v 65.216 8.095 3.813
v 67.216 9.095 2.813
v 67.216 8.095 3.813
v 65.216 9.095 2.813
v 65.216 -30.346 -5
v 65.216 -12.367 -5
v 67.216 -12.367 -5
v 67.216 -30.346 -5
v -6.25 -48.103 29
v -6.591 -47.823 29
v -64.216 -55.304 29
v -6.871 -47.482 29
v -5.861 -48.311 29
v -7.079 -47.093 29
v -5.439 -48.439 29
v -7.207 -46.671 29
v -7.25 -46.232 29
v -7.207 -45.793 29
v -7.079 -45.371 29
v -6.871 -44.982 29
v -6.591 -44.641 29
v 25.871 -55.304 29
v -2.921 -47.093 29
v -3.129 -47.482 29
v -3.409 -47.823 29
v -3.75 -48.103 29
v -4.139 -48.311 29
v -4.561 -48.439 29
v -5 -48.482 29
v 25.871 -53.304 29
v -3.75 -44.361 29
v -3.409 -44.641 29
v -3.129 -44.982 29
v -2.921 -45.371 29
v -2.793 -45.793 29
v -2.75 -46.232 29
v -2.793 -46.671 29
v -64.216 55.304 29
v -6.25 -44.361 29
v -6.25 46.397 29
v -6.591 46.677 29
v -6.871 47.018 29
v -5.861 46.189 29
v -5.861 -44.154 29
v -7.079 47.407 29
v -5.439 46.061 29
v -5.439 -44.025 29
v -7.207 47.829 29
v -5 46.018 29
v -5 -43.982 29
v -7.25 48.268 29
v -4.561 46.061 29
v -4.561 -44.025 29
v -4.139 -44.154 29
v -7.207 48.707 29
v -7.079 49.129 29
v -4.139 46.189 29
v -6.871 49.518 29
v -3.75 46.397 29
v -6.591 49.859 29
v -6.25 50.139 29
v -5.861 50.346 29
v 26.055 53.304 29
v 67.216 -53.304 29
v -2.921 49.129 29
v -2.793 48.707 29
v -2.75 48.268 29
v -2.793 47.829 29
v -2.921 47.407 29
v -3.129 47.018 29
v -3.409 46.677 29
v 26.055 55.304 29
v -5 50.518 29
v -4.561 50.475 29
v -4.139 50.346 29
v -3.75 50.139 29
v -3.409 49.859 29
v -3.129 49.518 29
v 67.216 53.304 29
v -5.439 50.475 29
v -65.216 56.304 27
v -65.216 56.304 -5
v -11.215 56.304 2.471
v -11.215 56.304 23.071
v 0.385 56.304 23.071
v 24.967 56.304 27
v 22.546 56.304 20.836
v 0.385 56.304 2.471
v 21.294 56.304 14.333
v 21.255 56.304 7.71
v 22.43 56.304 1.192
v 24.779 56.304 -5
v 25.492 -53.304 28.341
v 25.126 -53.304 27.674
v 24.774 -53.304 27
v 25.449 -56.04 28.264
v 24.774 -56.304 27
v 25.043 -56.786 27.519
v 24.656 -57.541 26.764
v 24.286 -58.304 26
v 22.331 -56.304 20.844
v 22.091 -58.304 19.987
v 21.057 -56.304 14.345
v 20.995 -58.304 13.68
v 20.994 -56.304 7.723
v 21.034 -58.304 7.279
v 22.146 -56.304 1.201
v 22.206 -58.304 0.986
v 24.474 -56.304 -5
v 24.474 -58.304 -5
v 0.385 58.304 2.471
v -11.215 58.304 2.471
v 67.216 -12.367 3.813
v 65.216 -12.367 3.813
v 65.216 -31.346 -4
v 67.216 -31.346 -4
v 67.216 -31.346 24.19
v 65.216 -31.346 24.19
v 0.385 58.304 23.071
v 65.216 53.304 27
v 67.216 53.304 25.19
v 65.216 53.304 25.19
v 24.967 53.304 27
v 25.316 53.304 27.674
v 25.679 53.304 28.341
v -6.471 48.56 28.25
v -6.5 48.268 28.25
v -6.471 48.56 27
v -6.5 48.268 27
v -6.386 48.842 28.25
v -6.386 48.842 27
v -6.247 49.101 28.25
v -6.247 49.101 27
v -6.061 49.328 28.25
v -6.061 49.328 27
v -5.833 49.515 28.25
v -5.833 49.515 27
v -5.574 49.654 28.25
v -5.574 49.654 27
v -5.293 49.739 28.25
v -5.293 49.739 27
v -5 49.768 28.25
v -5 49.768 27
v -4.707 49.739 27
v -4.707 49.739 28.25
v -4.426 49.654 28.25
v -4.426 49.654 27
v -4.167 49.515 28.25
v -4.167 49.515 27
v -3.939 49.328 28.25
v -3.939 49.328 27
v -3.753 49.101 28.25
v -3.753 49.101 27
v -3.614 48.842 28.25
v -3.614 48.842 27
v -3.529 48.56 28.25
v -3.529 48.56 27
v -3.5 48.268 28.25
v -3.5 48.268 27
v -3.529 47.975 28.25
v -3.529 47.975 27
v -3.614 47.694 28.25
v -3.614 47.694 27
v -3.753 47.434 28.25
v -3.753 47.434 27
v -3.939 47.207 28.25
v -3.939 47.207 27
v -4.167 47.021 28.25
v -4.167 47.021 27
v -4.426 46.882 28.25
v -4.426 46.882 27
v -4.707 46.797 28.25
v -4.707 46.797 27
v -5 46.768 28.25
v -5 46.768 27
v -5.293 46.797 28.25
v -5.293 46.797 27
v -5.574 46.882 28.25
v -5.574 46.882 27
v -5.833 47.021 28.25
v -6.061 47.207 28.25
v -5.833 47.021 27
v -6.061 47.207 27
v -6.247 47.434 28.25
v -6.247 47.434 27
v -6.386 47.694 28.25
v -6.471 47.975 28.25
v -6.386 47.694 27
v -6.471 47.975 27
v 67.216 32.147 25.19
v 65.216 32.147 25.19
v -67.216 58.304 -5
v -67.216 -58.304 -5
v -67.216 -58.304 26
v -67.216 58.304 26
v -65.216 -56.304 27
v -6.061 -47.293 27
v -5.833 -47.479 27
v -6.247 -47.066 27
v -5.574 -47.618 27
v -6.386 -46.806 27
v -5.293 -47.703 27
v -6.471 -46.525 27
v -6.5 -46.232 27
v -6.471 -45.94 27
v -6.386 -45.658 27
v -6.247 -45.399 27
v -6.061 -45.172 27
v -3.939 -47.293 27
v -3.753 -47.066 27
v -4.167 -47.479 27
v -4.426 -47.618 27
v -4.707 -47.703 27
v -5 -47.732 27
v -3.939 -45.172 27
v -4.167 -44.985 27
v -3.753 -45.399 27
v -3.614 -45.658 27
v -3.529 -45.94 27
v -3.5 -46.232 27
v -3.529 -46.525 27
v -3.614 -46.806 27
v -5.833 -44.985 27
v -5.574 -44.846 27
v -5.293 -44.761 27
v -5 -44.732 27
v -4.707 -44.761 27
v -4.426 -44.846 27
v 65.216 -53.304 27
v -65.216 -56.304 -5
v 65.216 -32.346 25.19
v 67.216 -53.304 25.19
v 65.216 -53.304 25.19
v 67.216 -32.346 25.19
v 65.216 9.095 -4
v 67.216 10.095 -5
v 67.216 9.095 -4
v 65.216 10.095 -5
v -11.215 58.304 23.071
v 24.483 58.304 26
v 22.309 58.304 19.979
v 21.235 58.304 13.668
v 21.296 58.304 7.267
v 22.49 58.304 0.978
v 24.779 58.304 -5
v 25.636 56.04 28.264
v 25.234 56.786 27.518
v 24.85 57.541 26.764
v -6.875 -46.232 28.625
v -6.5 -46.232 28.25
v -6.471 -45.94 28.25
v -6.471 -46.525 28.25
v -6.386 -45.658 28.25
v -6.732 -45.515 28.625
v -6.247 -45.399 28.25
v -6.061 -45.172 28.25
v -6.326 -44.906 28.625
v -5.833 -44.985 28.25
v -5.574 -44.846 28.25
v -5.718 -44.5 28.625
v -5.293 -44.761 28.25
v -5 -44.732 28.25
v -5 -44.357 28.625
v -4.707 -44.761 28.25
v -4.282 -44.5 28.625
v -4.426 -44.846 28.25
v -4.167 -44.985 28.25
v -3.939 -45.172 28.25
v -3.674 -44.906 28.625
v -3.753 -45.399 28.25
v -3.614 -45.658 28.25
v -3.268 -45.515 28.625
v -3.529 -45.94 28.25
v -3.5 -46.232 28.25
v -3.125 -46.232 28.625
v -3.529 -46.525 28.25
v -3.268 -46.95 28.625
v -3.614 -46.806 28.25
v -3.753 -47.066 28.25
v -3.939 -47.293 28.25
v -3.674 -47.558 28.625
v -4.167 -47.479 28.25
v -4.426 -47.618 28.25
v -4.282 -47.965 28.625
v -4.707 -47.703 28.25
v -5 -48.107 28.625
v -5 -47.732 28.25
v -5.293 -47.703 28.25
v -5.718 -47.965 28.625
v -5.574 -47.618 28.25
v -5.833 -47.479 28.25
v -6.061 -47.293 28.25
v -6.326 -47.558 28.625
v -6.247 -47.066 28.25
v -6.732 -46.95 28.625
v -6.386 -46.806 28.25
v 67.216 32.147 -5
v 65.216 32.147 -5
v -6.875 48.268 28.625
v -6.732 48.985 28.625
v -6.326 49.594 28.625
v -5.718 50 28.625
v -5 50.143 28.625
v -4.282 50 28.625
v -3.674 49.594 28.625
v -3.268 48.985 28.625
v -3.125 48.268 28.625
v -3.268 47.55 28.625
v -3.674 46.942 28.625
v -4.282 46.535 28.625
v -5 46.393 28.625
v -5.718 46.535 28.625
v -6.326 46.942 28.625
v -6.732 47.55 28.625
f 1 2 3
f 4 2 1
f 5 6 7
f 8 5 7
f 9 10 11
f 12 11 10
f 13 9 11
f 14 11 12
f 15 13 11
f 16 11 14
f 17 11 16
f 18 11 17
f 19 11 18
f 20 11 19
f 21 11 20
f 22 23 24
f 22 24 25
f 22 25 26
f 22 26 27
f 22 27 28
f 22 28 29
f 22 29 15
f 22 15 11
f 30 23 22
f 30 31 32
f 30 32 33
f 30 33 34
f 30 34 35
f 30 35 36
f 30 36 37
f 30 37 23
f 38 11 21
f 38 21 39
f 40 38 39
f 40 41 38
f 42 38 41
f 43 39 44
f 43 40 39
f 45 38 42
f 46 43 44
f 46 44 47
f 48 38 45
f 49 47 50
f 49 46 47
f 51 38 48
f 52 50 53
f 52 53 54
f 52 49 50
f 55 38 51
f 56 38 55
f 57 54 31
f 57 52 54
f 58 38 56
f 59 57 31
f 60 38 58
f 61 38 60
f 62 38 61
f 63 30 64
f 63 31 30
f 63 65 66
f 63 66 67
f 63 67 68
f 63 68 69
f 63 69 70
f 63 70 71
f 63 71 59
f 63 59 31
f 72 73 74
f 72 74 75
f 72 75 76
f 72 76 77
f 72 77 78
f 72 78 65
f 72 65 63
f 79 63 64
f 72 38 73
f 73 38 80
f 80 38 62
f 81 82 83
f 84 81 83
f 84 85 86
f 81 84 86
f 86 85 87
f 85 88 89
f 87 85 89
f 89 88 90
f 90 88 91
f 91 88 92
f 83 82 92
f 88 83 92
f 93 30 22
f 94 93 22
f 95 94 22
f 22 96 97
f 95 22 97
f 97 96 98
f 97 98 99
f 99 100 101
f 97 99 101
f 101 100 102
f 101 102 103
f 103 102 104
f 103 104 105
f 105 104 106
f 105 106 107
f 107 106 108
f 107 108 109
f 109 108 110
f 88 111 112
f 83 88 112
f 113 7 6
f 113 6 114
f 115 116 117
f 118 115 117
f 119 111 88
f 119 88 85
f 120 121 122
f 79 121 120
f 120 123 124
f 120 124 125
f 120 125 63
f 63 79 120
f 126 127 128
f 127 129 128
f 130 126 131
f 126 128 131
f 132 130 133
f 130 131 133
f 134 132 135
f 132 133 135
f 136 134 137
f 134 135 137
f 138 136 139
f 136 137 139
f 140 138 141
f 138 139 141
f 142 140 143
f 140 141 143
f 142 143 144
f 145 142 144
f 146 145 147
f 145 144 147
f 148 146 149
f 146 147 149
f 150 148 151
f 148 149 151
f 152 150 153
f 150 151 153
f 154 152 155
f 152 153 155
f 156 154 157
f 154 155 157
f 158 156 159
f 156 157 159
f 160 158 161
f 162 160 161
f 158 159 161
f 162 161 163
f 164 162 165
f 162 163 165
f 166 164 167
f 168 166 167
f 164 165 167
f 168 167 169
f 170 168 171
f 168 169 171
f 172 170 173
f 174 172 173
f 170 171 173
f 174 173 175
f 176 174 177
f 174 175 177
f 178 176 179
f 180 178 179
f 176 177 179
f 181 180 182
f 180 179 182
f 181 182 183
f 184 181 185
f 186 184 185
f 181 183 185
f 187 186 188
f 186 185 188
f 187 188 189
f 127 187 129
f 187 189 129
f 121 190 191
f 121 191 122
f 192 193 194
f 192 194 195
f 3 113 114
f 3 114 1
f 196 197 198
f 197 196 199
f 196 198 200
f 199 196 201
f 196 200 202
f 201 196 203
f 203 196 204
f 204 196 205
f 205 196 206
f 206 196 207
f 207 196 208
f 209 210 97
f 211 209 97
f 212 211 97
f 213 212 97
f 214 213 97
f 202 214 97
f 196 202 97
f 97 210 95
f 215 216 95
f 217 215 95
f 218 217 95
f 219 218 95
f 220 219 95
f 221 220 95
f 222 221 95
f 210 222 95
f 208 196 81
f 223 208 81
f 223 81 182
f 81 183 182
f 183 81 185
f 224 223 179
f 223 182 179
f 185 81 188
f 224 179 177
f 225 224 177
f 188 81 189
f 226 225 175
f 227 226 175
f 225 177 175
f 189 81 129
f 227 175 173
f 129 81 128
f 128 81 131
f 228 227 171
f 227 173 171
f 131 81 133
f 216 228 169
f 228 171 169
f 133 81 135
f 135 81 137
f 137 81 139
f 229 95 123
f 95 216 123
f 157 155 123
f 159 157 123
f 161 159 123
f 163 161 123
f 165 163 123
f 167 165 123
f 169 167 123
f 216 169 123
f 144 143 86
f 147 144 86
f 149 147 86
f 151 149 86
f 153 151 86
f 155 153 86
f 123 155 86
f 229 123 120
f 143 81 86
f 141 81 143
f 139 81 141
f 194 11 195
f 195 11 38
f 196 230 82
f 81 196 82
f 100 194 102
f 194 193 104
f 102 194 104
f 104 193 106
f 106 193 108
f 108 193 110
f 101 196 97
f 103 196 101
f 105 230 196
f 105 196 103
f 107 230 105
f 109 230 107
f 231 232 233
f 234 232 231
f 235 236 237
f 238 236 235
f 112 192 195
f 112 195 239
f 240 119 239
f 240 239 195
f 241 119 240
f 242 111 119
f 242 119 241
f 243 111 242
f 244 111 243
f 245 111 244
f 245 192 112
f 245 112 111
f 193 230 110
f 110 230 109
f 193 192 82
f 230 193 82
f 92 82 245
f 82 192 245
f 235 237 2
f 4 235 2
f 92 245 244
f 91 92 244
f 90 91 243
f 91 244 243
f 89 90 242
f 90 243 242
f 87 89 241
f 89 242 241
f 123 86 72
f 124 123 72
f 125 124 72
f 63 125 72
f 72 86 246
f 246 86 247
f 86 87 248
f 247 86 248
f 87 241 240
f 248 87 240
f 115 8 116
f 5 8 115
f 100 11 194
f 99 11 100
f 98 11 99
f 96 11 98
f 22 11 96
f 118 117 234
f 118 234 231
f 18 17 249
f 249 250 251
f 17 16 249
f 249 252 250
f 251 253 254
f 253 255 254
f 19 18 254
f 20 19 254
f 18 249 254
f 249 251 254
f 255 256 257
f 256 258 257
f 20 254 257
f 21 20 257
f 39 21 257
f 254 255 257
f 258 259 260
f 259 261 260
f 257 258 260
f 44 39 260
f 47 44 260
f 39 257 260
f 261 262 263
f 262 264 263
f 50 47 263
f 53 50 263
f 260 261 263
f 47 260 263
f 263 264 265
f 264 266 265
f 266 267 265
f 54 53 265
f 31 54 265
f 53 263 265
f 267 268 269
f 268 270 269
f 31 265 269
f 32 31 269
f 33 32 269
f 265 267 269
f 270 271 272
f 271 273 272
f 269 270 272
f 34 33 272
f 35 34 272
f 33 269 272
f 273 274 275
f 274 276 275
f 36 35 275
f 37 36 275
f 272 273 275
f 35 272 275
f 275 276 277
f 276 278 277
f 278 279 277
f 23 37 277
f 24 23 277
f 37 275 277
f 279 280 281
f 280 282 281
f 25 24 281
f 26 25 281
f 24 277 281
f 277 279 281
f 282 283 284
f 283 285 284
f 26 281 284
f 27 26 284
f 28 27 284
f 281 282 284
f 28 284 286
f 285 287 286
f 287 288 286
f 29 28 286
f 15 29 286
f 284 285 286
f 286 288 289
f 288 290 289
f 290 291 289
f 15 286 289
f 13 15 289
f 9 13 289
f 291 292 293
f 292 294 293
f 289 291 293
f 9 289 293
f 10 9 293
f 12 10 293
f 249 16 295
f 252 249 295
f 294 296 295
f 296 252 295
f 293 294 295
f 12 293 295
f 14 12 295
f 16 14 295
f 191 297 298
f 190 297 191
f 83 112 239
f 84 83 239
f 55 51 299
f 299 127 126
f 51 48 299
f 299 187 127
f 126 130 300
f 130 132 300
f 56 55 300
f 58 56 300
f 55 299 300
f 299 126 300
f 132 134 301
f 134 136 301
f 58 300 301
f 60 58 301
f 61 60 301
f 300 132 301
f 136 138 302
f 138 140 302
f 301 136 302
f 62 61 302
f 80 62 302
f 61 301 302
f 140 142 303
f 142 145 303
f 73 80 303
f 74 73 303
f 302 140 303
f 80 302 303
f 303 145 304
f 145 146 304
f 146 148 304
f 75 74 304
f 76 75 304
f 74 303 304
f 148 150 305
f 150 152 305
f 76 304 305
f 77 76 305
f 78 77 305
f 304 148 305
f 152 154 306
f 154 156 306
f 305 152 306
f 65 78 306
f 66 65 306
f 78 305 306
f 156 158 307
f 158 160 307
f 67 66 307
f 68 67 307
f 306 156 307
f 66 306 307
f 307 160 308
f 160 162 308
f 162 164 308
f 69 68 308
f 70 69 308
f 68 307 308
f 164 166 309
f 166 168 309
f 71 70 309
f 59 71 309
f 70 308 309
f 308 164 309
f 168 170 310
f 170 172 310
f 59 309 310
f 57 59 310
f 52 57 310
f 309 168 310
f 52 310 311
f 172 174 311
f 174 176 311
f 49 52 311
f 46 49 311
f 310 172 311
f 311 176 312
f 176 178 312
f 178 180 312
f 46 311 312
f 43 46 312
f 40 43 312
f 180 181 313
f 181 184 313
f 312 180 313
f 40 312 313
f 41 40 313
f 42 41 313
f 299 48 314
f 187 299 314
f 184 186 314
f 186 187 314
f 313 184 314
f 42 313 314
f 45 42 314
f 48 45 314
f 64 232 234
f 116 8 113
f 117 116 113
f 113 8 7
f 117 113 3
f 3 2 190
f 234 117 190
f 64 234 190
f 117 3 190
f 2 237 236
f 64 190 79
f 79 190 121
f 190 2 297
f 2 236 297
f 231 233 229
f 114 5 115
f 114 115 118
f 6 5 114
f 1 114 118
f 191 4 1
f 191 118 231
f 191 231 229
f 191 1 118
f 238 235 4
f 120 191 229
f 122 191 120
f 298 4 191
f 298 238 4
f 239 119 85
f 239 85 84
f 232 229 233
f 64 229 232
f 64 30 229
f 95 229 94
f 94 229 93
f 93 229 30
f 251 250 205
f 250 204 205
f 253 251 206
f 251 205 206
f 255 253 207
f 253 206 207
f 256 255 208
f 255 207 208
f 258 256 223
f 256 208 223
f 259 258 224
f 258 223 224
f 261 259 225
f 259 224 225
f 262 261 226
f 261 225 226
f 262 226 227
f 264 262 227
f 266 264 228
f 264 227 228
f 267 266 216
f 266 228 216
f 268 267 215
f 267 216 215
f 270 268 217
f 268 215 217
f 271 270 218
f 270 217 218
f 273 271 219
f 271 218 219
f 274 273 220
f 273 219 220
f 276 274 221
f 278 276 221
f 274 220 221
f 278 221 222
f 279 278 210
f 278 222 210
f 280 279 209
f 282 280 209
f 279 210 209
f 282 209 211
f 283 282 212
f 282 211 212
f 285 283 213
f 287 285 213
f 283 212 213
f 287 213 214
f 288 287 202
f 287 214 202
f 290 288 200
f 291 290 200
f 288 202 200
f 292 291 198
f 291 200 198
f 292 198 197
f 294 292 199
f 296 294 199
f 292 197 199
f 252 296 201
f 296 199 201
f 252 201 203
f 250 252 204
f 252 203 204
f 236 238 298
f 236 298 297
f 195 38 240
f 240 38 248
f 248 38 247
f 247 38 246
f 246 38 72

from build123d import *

# Parameters (mm, degrees)
SKETCH008_W      = 134.431716
SKETCH008_H      = 116.608648
PAD008_DEPTH     = 34
THICKNESS_T      = -2
HOLE_D           = 3
HOLE_DEPTH       = 25
HOLE_CSINK_D     = 4.5
HOLE_CSINK_ANGLE = 90
HOLE_TIPS_R      = 1.5
SKETCH011_W      = 22.22
SKETCH011_H      = 30.19
SKETCH011_W_2    = 21.462421
SKETCH011_H_2    = 8.812902
POCKET_DEPTH     = 5
SKETCH012_R      = 36
POCKET001_DEPTH  = 5
SKETCH013_R      = 36
POCKET002_DEPTH  = 5
CHAMFER_SIZE     = 3
SKETCH015_W      = 11.6
SKETCH015_H      = 20.6
POCKET003_DEPTH  = 5
CHAMFER001_SIZE  = 1


with BuildPart() as part:
    # Sketch008 → Pad008 (new body)
    with BuildSketch(Plane.XY):
        Rectangle(SKETCH008_W, SKETCH008_H)
    extrude(amount=PAD008_DEPTH)

    # Thickness
    thickness_openings = [part.faces().sort_by_distance(p)[0] for p in [
        (0, 0, 0),
    ]]
    offset(amount=THICKNESS_T, openings=thickness_openings)

    # Hole
    with Locations(Plane.XY.offset(34)):
        with Locations((-5, 48.267742), (-5, -46.232258)):
            CounterSinkHole(HOLE_D / 2, HOLE_CSINK_D / 2, depth=HOLE_DEPTH, counter_sink_angle=HOLE_CSINK_ANGLE)

    # Hole tips → Hole tip 1 section 0
    with BuildSketch(Plane.XY.offset(9), mode=Mode.PRIVATE) as hole_tip_1_s0:
        with Locations((-5, 48.267742)):
            Circle(HOLE_TIPS_R)
    loft([hole_tip_1_s0.sketch, Vertex(-5, 48.267742, 8.098709)], mode=Mode.SUBTRACT)

    # Hole tips → Hole tip 2 section 0
    with BuildSketch(Plane.XY.offset(9), mode=Mode.PRIVATE) as hole_tip_2_s0:
        with Locations((-5, -46.232258)):
            Circle(HOLE_TIPS_R)
    loft([hole_tip_2_s0.sketch, Vertex(-5, -46.232258, 8.098709)], mode=Mode.SUBTRACT)

    # Sketch011 (on Face3 of Hole) → Pocket (cut)
    with BuildSketch(Plane.YZ.offset(67.215858)):
        with Locations((43.25677, 15.095)):
            Rectangle(SKETCH011_W, SKETCH011_H)
        with Locations((-42.456113, 15.095)):
            Rectangle(SKETCH011_W, SKETCH011_H)
        with Locations((-1.636131, 4.406451)):
            Rectangle(SKETCH011_W_2, SKETCH011_H_2)
    extrude(amount=-POCKET_DEPTH, mode=Mode.SUBTRACT)

    # Sketch012 (on Face1 of Pocket) → Pocket001 (cut)
    with BuildSketch(Plane(origin=(0, 58.304324, 0), x_dir=(-1, 0, 0), z_dir=(0, 1, 0))):
        with Locations((-57.121563, 15.810025)):
            Circle(SKETCH012_R)
    extrude(amount=-POCKET001_DEPTH, mode=Mode.SUBTRACT)

    # Sketch013 (on Face13 of Pocket001) → Pocket002 (cut)
    with BuildSketch(Plane.XZ.offset(58.304324)):
        with Locations((56.871254, 15.696718)):
            Circle(SKETCH013_R)
    extrude(amount=-POCKET002_DEPTH, mode=Mode.SUBTRACT)

    # Chamfer
    chamfer_edges = [part.edges().sort_by_distance(p)[0] for p in [
        (-20.67222, -58.304324, 34),
        (-67.215858, 0, 34),
        (-20.580376, 58.304324, 34),
    ]]
    chamfer(chamfer_edges, length=CHAMFER_SIZE)

    # Sketch015 (on Face1 of Chamfer) → Pocket003 (cut)
    with BuildSketch(Plane(origin=(0, 58.304324, 0), x_dir=(-1, 0, 0), z_dir=(0, 1, 0))):
        with Locations((5.414926, 17.771388)):
            Rectangle(SKETCH015_W, SKETCH015_H)
    extrude(amount=-POCKET003_DEPTH, mode=Mode.SUBTRACT)

    # Chamfer001
    chamfer001_edges = [part.edges().sort_by_distance(p)[0] for p in [
        (66.215858, -31.346113, 0),
        (66.215858, -31.346113, 30.19),
        (66.215858, 9.09508, 8.812902),
        (66.215858, 9.09508, 0),
    ]]
    chamfer(chamfer001_edges, length=CHAMFER001_SIZE)


with BuildPart() as part_1:
    # Body001 placement: moved
    add(part.part.moved(Location((0, 0, -5))))


solid = part_1.part
